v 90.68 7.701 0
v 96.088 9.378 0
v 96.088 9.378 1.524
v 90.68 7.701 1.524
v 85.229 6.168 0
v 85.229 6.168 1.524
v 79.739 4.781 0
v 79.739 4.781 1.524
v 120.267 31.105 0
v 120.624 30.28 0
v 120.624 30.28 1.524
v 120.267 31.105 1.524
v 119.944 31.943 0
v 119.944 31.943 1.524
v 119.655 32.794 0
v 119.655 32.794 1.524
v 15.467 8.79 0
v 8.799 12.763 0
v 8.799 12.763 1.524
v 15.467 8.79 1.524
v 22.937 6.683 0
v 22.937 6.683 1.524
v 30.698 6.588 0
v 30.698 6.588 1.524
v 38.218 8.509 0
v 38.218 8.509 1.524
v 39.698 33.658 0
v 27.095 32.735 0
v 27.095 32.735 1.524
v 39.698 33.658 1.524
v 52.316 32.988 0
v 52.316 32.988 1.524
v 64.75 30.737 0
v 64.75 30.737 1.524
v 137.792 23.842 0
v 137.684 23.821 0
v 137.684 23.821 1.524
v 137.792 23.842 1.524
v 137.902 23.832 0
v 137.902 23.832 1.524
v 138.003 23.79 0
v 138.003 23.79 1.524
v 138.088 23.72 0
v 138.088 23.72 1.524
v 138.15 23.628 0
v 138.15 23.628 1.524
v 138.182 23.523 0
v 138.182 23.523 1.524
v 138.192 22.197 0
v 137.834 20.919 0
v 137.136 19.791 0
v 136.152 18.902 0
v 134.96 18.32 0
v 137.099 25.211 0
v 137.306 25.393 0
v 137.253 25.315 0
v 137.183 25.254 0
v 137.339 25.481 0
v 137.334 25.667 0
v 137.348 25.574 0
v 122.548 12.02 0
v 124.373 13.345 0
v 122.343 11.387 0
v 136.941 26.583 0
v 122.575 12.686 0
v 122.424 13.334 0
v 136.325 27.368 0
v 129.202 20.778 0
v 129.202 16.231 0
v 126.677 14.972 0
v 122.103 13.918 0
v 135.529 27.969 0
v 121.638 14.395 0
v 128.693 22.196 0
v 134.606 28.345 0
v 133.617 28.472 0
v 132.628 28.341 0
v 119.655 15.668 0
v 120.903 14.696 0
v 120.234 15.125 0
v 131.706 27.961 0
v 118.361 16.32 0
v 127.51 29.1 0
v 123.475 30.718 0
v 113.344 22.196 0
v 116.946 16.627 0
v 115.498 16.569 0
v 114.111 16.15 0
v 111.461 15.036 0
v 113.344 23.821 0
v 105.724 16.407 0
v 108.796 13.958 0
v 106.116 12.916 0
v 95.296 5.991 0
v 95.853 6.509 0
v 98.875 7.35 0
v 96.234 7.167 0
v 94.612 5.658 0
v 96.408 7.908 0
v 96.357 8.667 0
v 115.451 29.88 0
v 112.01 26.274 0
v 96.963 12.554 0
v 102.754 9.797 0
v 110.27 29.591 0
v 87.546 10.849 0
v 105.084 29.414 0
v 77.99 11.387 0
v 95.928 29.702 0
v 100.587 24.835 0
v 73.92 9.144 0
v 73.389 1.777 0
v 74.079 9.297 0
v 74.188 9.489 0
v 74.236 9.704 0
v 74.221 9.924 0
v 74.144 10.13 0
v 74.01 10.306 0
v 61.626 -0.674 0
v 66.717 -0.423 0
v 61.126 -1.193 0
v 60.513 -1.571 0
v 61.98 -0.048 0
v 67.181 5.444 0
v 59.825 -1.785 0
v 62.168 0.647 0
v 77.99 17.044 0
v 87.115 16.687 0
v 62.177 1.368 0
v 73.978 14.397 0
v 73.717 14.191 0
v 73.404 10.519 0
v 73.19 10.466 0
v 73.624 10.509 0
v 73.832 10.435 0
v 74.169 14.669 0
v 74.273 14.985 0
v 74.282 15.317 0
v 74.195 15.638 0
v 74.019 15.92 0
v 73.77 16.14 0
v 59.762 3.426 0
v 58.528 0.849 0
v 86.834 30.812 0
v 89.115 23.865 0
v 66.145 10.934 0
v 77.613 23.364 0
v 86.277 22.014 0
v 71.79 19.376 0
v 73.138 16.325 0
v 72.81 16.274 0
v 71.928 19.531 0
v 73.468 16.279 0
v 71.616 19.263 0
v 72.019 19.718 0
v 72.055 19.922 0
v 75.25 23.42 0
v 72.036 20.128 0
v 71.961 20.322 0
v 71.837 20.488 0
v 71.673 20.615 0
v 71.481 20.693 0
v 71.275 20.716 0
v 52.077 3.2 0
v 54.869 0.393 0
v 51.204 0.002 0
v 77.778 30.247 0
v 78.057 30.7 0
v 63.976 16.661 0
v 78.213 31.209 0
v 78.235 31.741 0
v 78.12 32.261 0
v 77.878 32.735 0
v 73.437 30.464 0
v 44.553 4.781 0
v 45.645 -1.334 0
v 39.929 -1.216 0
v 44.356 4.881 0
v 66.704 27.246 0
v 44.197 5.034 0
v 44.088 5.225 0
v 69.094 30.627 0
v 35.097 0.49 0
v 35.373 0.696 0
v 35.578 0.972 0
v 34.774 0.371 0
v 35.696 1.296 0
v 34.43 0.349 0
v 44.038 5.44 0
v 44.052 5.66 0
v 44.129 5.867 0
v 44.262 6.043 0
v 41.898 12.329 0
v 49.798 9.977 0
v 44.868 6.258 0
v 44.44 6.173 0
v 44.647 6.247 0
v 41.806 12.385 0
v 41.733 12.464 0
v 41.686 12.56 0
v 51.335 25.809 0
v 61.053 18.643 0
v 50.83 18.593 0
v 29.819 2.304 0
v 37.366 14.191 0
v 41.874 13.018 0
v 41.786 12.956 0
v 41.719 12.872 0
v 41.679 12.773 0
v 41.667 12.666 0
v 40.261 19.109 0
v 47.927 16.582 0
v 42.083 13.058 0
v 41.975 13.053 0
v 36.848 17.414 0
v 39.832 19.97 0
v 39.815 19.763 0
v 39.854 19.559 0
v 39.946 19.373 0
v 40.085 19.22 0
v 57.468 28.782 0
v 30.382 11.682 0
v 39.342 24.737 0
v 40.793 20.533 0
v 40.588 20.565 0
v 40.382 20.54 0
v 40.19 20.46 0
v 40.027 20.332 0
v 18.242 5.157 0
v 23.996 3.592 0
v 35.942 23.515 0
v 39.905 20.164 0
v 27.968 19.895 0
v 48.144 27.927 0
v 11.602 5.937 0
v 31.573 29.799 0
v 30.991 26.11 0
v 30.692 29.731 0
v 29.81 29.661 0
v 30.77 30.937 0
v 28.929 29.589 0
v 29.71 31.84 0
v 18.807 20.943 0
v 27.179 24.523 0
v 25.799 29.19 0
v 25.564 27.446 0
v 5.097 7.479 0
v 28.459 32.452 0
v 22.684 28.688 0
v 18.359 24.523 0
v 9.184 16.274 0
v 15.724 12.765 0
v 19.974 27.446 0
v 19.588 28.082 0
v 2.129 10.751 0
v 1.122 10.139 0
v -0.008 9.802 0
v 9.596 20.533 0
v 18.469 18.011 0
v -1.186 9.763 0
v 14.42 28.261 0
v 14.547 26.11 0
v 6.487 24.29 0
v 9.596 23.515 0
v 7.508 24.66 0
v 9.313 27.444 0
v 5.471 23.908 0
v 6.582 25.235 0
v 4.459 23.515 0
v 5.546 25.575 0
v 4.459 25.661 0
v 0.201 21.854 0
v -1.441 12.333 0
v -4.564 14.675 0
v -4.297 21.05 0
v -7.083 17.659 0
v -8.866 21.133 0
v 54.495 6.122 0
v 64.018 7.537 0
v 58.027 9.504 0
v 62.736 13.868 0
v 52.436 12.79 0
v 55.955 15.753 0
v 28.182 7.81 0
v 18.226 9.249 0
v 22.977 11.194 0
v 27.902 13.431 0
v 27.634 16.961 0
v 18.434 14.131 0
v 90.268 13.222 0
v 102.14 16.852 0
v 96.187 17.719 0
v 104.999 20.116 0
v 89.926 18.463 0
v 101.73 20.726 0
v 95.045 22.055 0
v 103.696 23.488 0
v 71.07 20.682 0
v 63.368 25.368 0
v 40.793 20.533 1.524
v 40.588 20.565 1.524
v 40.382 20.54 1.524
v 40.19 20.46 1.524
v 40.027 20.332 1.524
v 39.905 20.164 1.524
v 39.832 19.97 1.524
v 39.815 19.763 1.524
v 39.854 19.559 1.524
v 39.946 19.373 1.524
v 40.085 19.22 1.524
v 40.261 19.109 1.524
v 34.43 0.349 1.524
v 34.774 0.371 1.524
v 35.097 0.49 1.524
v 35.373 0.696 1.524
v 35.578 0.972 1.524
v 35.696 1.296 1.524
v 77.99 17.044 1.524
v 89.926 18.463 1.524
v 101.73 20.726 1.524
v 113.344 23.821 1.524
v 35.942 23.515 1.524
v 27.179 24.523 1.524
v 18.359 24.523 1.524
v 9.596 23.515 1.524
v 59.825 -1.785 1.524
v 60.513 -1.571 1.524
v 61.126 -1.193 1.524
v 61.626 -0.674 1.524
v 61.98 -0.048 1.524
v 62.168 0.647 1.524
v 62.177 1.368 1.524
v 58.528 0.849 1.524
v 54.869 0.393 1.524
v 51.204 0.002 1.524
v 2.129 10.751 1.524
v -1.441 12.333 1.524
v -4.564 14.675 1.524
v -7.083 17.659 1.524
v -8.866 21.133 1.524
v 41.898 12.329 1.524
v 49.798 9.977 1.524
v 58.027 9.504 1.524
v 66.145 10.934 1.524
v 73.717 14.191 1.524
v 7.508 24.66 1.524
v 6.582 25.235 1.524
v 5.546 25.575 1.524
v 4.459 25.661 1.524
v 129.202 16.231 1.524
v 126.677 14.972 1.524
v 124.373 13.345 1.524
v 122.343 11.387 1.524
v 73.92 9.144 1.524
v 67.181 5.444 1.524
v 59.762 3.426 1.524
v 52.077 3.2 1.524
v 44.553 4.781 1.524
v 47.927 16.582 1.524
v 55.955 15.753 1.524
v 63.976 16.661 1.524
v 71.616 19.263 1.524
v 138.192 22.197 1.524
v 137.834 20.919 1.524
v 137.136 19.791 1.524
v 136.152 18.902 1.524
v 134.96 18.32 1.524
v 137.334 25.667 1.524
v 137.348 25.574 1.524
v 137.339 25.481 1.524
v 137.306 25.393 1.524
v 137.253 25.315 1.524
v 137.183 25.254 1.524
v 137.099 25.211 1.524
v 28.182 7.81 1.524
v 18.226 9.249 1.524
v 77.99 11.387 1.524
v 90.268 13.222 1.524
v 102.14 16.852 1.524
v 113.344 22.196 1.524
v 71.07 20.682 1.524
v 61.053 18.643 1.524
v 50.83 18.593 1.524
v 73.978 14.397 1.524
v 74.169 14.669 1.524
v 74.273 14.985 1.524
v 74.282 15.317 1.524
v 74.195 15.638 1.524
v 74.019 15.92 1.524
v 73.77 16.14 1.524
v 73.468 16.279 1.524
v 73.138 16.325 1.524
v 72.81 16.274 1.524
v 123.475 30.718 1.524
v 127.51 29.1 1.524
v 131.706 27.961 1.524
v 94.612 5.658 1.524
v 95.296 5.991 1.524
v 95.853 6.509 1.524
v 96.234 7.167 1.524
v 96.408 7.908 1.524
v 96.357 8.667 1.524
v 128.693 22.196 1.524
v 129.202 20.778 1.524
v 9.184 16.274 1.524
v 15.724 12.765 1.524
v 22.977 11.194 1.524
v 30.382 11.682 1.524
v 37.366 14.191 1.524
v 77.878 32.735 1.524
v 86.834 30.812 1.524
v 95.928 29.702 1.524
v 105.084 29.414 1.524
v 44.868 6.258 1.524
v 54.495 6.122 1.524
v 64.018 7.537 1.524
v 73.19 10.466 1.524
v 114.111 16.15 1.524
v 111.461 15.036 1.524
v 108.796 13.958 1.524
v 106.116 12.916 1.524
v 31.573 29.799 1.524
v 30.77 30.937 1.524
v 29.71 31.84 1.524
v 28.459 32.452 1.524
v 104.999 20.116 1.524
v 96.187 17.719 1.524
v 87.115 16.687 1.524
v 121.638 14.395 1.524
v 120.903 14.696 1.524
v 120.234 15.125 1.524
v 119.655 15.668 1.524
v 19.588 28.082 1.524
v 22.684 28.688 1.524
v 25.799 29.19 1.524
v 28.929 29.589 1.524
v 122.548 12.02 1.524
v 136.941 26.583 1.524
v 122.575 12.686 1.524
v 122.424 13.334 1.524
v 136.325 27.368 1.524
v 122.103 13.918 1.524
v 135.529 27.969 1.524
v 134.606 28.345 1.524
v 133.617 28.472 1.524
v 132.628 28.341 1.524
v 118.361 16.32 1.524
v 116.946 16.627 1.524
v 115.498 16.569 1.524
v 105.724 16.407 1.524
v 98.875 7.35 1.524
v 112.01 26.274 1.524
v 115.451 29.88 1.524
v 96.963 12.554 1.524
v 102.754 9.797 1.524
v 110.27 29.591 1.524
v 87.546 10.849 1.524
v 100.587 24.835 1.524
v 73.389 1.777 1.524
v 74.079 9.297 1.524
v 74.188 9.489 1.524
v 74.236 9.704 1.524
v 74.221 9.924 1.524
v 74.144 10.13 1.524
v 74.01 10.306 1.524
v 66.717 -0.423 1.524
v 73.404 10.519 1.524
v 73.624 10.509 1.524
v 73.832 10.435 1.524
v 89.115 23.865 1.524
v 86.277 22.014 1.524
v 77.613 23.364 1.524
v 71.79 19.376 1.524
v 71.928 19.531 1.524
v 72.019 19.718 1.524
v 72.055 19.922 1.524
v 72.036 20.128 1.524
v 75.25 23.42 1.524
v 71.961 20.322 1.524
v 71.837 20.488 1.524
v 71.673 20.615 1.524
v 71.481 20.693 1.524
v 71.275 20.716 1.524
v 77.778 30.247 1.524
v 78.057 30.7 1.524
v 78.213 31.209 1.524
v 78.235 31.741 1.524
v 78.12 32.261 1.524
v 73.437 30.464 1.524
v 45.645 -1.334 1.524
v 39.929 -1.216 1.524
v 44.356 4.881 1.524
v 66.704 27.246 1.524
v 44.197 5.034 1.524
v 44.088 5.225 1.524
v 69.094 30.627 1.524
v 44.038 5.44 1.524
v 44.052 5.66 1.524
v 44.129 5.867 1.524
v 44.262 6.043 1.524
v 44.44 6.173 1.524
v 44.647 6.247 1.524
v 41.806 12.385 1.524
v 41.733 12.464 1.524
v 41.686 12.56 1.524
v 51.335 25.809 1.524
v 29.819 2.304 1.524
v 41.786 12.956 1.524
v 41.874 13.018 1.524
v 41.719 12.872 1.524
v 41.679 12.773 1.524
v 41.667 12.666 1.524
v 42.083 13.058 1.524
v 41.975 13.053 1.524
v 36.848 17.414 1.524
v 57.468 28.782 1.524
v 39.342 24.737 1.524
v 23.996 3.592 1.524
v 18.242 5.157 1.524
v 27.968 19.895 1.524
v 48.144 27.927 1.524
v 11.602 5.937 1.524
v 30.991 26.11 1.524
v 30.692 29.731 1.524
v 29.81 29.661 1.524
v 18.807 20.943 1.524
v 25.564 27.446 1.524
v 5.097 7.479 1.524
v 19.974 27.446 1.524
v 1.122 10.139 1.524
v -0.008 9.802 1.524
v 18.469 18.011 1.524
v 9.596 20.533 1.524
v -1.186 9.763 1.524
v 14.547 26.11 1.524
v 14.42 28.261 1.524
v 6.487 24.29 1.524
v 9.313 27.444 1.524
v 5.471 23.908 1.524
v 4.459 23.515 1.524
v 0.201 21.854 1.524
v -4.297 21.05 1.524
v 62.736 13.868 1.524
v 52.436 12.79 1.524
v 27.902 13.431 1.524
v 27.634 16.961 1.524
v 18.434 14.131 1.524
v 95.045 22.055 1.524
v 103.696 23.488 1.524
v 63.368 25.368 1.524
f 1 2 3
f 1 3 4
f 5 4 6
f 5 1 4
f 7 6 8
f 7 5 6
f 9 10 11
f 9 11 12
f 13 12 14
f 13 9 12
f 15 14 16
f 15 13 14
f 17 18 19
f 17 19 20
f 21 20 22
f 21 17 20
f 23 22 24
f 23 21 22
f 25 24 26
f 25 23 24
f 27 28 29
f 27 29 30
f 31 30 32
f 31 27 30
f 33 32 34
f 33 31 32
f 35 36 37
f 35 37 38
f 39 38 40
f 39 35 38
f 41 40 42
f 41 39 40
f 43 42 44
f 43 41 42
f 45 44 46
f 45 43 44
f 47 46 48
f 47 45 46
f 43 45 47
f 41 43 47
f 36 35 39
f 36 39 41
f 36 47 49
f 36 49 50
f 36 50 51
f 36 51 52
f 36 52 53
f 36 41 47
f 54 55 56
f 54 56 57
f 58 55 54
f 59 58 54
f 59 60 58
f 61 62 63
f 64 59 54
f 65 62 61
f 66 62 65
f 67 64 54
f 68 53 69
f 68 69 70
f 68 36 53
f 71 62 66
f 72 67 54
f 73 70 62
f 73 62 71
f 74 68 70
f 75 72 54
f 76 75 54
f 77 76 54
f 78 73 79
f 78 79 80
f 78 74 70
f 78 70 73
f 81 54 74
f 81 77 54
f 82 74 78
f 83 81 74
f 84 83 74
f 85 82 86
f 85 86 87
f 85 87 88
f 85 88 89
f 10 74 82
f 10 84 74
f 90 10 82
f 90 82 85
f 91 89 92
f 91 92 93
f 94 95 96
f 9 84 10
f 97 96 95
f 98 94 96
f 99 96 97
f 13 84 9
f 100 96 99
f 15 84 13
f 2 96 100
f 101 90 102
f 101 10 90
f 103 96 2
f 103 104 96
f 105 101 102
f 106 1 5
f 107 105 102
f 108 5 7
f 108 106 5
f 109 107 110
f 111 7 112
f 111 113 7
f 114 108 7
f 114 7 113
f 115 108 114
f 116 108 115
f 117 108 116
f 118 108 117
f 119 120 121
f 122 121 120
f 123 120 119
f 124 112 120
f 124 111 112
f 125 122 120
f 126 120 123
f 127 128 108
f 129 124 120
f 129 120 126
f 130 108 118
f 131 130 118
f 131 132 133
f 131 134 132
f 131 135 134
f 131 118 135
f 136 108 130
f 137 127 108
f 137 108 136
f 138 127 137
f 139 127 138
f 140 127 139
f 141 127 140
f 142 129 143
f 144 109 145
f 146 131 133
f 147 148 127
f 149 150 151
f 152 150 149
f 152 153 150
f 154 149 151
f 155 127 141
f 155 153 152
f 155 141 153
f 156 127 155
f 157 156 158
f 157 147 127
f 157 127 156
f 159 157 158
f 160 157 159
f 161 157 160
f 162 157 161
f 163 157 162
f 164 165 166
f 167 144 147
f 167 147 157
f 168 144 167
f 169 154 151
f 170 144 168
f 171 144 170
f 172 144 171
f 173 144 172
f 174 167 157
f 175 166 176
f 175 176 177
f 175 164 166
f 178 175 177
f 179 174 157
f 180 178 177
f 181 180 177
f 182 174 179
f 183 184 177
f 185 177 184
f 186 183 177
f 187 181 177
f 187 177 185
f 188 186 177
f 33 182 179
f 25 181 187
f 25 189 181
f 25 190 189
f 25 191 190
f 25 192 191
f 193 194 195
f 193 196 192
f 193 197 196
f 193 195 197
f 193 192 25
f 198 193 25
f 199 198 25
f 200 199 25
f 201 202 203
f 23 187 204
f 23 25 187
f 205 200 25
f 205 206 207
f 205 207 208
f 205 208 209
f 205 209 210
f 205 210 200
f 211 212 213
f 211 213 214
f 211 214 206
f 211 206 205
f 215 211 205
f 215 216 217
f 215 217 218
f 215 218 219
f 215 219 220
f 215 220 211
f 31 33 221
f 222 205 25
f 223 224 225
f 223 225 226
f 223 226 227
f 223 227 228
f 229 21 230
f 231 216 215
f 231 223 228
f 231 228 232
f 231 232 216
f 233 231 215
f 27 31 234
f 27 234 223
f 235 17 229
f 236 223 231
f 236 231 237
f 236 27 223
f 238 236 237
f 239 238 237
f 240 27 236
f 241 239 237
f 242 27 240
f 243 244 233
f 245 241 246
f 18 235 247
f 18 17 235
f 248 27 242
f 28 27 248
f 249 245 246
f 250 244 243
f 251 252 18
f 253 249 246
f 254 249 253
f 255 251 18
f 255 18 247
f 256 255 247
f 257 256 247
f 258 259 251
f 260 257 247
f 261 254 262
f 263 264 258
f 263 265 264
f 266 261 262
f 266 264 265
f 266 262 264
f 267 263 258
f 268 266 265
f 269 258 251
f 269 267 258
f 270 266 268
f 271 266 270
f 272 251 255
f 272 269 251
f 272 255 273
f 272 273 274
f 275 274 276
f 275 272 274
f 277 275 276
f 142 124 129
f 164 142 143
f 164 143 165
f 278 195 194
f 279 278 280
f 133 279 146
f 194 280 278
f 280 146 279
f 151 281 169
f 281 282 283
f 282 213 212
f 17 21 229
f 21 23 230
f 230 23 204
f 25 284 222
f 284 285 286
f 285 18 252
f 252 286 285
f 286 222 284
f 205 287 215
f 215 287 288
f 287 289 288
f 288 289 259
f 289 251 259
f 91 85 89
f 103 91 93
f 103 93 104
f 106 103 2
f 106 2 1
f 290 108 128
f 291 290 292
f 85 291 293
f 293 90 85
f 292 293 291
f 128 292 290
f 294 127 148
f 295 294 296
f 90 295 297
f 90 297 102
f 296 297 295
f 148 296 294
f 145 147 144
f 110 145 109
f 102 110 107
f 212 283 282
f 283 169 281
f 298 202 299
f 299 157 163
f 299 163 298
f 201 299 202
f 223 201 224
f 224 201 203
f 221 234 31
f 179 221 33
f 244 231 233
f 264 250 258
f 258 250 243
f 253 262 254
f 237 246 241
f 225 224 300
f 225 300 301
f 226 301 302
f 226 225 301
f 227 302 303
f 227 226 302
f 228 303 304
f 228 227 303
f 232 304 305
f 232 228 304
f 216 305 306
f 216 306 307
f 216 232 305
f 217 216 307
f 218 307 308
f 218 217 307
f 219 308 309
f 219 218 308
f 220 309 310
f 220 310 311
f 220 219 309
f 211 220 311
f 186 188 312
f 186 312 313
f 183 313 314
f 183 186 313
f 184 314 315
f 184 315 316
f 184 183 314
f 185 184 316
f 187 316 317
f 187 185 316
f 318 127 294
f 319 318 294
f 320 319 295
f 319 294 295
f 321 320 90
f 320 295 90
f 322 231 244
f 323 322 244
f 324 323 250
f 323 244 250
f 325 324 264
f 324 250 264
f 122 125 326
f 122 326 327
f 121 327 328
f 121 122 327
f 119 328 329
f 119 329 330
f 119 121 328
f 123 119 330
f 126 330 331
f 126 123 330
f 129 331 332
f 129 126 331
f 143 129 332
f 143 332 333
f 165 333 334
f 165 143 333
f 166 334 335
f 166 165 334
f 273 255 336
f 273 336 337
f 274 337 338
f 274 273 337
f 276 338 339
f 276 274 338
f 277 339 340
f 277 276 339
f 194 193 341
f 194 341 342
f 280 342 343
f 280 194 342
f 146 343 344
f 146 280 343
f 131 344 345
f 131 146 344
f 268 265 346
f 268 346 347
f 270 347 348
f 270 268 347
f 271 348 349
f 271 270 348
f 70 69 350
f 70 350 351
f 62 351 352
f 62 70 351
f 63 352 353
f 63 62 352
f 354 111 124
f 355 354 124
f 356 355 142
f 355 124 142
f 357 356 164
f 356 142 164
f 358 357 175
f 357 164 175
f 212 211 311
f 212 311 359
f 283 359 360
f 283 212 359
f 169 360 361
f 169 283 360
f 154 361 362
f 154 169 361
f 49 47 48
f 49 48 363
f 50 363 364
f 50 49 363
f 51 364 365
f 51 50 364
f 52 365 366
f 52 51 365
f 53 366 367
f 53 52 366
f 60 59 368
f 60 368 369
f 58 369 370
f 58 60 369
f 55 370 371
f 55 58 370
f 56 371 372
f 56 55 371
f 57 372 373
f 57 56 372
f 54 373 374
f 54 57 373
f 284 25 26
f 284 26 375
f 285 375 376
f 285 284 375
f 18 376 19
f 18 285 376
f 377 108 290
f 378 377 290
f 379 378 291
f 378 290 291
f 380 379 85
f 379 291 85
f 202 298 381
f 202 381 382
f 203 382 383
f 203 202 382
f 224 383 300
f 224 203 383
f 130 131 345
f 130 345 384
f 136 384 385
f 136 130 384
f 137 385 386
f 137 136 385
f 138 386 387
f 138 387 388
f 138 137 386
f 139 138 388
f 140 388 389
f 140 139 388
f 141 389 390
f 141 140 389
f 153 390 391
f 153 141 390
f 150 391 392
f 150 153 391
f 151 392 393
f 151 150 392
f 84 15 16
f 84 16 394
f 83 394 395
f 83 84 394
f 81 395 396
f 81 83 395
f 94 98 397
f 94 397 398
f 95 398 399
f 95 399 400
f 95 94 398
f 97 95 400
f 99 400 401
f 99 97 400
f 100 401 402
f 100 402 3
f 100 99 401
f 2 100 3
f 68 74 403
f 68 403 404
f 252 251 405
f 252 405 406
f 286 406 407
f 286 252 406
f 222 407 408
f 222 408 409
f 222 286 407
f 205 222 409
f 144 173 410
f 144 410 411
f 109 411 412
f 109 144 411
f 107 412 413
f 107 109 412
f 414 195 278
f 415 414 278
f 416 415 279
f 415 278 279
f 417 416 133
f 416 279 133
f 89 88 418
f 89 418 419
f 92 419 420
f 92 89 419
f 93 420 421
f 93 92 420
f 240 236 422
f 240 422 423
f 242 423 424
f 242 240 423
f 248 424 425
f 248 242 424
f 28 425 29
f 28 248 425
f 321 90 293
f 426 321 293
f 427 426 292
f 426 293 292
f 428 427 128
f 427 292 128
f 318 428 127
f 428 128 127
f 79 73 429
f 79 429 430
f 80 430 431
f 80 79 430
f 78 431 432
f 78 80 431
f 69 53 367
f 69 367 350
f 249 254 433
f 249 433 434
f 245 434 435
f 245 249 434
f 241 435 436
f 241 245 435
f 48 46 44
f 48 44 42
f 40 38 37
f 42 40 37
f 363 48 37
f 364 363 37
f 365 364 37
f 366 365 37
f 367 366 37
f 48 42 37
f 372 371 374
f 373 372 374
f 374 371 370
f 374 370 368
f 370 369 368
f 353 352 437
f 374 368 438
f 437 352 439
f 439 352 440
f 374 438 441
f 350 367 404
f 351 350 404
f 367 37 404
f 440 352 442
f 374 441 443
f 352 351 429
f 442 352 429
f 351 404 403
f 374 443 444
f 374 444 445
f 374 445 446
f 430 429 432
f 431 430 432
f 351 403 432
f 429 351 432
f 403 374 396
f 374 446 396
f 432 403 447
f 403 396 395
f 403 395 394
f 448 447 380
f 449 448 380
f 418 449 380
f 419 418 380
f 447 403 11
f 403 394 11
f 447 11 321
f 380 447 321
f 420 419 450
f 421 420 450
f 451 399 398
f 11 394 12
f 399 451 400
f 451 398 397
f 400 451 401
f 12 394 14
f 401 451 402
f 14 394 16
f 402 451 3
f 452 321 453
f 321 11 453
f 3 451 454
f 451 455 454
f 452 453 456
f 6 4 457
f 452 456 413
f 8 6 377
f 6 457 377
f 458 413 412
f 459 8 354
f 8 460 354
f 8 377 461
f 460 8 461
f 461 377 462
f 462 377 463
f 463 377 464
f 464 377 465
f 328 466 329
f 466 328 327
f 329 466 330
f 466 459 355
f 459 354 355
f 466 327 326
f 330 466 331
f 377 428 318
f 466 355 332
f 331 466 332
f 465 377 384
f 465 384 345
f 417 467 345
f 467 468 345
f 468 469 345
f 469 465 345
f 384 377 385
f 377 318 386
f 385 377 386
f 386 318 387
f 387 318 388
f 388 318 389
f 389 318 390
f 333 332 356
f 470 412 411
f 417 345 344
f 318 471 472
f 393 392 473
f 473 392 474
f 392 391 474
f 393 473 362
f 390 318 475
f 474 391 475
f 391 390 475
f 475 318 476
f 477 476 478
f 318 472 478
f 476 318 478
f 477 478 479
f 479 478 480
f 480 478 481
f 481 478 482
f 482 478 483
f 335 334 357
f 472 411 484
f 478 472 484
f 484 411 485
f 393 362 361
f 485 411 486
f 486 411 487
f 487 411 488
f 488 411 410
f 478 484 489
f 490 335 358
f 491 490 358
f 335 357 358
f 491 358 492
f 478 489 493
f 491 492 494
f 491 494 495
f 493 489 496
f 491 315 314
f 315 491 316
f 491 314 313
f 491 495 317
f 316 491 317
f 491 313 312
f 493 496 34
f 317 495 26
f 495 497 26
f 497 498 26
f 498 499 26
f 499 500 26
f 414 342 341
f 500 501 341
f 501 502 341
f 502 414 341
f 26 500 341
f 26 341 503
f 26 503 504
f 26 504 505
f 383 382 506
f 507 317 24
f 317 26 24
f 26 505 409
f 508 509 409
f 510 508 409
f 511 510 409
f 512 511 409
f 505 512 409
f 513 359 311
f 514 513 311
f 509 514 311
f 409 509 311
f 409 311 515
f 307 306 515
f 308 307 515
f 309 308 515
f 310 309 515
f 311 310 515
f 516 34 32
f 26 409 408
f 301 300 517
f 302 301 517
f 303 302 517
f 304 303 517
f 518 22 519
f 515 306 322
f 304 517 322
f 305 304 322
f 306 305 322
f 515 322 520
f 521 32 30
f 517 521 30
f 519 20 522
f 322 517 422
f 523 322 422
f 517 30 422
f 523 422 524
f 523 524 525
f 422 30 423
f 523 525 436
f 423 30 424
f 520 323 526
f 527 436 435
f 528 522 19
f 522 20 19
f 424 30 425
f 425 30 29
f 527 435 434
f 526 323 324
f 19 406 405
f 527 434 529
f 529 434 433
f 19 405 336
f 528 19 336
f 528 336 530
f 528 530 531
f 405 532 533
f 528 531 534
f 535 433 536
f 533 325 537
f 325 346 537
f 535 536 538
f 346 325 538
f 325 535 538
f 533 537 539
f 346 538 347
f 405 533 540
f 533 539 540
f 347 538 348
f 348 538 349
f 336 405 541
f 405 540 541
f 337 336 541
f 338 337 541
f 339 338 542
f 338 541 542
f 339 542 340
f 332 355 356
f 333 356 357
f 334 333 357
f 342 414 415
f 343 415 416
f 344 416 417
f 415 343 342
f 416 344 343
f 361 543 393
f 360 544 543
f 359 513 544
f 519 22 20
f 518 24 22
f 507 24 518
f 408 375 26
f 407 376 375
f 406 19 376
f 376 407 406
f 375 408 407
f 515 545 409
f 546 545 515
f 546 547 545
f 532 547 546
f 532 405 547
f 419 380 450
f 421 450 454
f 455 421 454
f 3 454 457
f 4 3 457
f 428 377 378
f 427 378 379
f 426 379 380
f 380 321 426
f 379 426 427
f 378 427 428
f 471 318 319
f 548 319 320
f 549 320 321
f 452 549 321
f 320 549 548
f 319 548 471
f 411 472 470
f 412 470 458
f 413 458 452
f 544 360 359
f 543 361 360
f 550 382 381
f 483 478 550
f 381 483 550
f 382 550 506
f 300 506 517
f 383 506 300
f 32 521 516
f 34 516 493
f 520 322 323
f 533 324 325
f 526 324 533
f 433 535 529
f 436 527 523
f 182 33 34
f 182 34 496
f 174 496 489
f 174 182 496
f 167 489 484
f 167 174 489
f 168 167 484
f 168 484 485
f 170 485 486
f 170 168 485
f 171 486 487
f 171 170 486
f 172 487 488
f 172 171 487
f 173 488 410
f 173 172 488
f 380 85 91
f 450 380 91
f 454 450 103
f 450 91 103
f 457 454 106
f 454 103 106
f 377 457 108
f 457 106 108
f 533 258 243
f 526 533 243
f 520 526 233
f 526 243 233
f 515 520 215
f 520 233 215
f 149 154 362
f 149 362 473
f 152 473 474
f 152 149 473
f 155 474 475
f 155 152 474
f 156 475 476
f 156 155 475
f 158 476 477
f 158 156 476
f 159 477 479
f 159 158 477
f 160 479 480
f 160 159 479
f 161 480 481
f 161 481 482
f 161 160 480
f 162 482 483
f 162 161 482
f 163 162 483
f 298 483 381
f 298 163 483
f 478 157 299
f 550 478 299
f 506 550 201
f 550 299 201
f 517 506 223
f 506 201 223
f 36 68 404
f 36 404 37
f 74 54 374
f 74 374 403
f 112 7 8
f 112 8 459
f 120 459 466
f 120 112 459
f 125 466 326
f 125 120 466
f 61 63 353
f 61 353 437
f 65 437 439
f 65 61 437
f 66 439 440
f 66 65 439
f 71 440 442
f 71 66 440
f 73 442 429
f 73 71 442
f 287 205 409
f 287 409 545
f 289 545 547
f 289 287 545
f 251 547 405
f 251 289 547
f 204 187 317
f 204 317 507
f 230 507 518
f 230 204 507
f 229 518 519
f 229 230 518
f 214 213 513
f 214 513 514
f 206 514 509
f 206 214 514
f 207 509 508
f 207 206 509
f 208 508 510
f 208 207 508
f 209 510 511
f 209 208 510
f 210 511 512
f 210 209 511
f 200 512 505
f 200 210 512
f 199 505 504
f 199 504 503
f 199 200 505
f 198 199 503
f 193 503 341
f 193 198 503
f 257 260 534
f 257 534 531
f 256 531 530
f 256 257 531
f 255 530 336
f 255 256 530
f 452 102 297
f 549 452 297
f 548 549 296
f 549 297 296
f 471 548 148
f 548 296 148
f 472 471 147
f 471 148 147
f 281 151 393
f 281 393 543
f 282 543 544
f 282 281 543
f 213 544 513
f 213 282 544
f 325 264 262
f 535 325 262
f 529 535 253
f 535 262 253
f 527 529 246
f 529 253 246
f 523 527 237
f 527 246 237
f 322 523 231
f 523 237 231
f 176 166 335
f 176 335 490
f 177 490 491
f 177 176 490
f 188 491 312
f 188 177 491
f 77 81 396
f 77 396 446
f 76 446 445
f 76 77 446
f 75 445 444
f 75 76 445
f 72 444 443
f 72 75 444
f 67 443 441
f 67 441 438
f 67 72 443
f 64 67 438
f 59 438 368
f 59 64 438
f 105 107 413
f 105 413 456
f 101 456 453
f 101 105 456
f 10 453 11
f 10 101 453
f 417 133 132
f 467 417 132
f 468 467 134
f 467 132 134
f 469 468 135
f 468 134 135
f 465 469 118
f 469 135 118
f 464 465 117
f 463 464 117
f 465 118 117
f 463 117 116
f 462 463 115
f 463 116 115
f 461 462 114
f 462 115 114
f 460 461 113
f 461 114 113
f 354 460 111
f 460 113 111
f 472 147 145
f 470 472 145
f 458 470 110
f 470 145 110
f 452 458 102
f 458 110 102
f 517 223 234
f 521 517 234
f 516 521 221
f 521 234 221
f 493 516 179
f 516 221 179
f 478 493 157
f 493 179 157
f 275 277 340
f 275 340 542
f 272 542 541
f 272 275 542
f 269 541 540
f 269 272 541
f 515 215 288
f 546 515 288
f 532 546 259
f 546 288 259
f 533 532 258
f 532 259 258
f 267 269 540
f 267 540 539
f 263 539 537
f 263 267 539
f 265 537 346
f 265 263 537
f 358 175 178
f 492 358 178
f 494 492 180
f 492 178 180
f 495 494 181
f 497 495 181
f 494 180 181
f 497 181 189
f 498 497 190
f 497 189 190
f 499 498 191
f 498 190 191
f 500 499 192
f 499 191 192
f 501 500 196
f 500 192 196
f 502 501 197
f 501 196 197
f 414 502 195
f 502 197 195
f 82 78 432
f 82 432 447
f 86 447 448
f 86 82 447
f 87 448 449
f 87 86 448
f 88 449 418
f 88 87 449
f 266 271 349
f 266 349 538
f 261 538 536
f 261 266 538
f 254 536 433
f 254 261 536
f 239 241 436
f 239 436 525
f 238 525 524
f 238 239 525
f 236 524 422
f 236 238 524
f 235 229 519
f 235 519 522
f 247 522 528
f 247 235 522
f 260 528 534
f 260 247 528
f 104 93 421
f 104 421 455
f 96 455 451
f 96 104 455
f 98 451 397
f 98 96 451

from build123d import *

# Parameters (mm, degrees)
BOSS_EXTRUDE1_DEPTH = 1.524


with BuildPart() as part:
    # Model → Boss-Extrude1 (new body)
    with BuildSketch(Plane.XY):
        with BuildLine():
            Line((134.96008858, 18.319511963), (129.201538518, 16.231235276))
            ThreePointArc((129.201538518, 16.231235276), (125.494314224, 14.202109959), (122.342593367, 11.386525267))
            ThreePointArc((122.342593367, 11.386525267), (122.521547644, 13.015286897), (121.637755911, 14.395069943))
            ThreePointArc((121.637755911, 14.395069943), (120.558535261, 14.894839146), (119.655012959, 15.668230327))
            ThreePointArc((119.655012959, 15.668230327), (116.945656671, 16.627230011), (114.111435919, 16.150276533))
            ThreePointArc((114.111435919, 16.150276533), (110.130348083, 14.492411945), (106.116427247, 12.915701804))
            ThreePointArc((106.116427247, 12.915701804), (100.871077069, 8.483544727), (94.612309809, 5.65767367))
            ThreePointArc((94.612309809, 5.65767367), (96.234412345, 7.167311858), (96.088279041, 9.378390589))
            ThreePointArc((96.088279041, 9.378390589), (87.959563224, 6.916430033), (79.738932416, 4.781365698))
            ThreePointArc((79.738932416, 4.781365698), (70.087015382, 0.573629162), (59.825334355, -1.784855875))
            ThreePointArc((59.825334355, -1.784855875), (61.625546567, -0.674388225), (62.177186804, 1.367570505))
            ThreePointArc((62.177186804, 1.367570505), (56.69945513, 0.613180121), (51.20394484, 0.001611808))
            ThreePointArc((51.20394484, 0.001611808), (42.783253785, -1.45847583), (34.430253575, 0.349086412))
            ThreePointArc((34.430253575, 0.349086412), (35.242407465, 0.582998344), (35.696308866, 1.295937508))
            ThreePointArc((35.696308866, 1.295937508), (26.899874012, 2.912690878), (18.24226034, 5.156991018))
            ThreePointArc((18.24226034, 5.156991018), (8.327270493, 6.613476825), (-1.186477097, 9.762600728))
            ThreePointArc((-1.186477097, 9.762600728), (0.567723509, 9.933888345), (2.129376981, 10.751077214))
            ThreePointArc((2.129376981, 10.751077214), (-4.564424076, 14.67509235), (-8.866303828, 21.132545253))
            ThreePointArc((-8.866303828, 21.132545253), (-2.028267146, 21.342243043), (4.458921798, 23.51459164))
            ThreePointArc((4.458921798, 23.51459164), (5.978589155, 24.100559155), (7.508094135, 24.660346004))
            ThreePointArc((7.508094135, 24.660346004), (6.073839254, 25.435989759), (4.458921798, 25.661271599))
            ThreePointArc((4.458921798, 25.661271599), (11.846812063, 27.976344953), (19.588212991, 28.082169784))
            ThreePointArc((19.588212991, 28.082169784), (24.23969735, 28.951914388), (28.92877134, 29.588583491))
            ThreePointArc((28.92877134, 29.588583491), (30.250891965, 29.696247396), (31.57341018, 29.798912074))
            ThreePointArc((31.57341018, 29.798912074), (29.710039, 31.839896858), (27.095456614, 32.73529062))
            ThreePointArc((27.095456614, 32.73529062), (46.017315853, 33.521760077), (64.749650783, 30.73699449))
            ThreePointArc((64.749650783, 30.73699449), (71.265909378, 30.552300799), (77.77761193, 30.246575893))
            ThreePointArc((77.77761193, 30.246575893), (78.240878226, 31.474299031), (77.877808016, 32.73529062))
            ThreePointArc((77.877808016, 32.73529062), (91.368554355, 30.154894712), (105.083859187, 29.413886469))
            ThreePointArc((105.083859187, 29.413886469), (112.860951548, 29.721873992), (120.624125013, 30.279690879))
            ThreePointArc((120.624125013, 30.279690879), (120.101426826, 31.522338532), (119.655012959, 32.794384617))
            ThreePointArc((119.655012959, 32.794384617), (125.469075261, 29.850060932), (131.706292975, 27.960754811))
            ThreePointArc((131.706292975, 27.960754811), (135.079830026, 28.186864843), (137.333813614, 25.666659301))
            ThreePointArc((137.333813614, 25.666659301), (137.306373673, 25.392750403), (137.099398505, 25.211255734))
            Line((137.099398505, 25.211255734), (128.692975928, 22.19615093))
            Line((128.692975928, 22.19615093), (129.201538518, 20.777960276))
            Line((129.201538518, 20.777960276), (137.683967254, 23.82080051))
            ThreePointArc((137.683967254, 23.82080051), (138.003306934, 23.78963562), (138.181844931, 23.523039923))
            ThreePointArc((138.181844931, 23.523039923), (137.524769068, 20.330730705), (134.96008858, 18.319511963))
        make_face()
        with BuildLine():
            ThreePointArc((113.344379689, 22.19615093), (96.963122218, 12.553503985), (77.990394499, 11.386525267))
            ThreePointArc((77.990394499, 11.386525267), (96.271224533, 14.816426058), (113.344379689, 22.19615093))
        make_face(mode=Mode.SUBTRACT)
        with BuildLine():
            ThreePointArc((113.344379689, 23.82080051), (96.187450512, 17.719248724), (77.990394499, 17.043744891))
            ThreePointArc((77.990394499, 17.043744891), (95.848162694, 19.489217449), (113.344379689, 23.82080051))
        make_face(mode=Mode.SUBTRACT)
        with BuildLine():
            ThreePointArc((112.010038699, 26.273742515), (95.04541072, 22.055495603), (77.613248587, 23.363904105))
            ThreePointArc((77.613248587, 23.363904105), (94.856261251, 24.29140484), (112.010038699, 26.273742515))
        make_face(mode=Mode.SUBTRACT)
        with BuildLine():
            ThreePointArc((73.920433764, 9.144198092), (59.762067232, 3.425519676), (44.552717894, 4.781365698))
            ThreePointArc((44.552717894, 4.781365698), (44.052345371, 5.659967485), (44.86760609, 6.258017419))
            ThreePointArc((44.86760609, 6.258017419), (59.284947166, 6.637177896), (73.189879005, 10.465540071))
            ThreePointArc((73.189879005, 10.465540071), (74.143785851, 10.130315533), (73.920433764, 9.144198092))
        make_face(mode=Mode.SUBTRACT)
        with BuildLine():
            ThreePointArc((73.7171882, 14.19085222), (74.195068041, 15.63804442), (72.809895852, 16.27367986))
            ThreePointArc((72.809895852, 16.27367986), (57.603683966, 13.161162203), (42.082533848, 13.058472776))
            ThreePointArc((42.082533848, 13.058472776), (41.678568271, 12.772614258), (41.897709615, 12.328902245))
            ThreePointArc((41.897709615, 12.328902245), (58.027223609, 9.504074716), (73.7171882, 14.19085222))
        make_face(mode=Mode.SUBTRACT)
        with BuildLine():
            ThreePointArc((71.615953494, 19.263251529), (72.005249, 20.227653753), (71.069824737, 20.682190977))
            ThreePointArc((71.069824737, 20.682190977), (55.942470801, 18.367444511), (40.793050931, 20.533077418))
            ThreePointArc((40.793050931, 20.533077418), (39.862149142, 20.069348511), (40.260924923, 19.10882755))
            ThreePointArc((40.260924923, 19.10882755), (55.955346454, 15.753106638), (71.615953494, 19.263251529))
        make_face(mode=Mode.SUBTRACT)
        with BuildLine():
            ThreePointArc((75.249897816, 23.419828185), (57.358073705, 25.777828917), (39.34157015, 24.737090166))
            ThreePointArc((39.34157015, 24.737090166), (57.468271047, 28.781788902), (75.249897816, 23.419828185))
        make_face(mode=Mode.SUBTRACT)
        with BuildLine():
            ThreePointArc((38.218093055, 8.509361046), (23.165664514, 8.263848957), (8.79939997, 12.763440518))
            ThreePointArc((8.79939997, 12.763440518), (22.937130999, 6.683446576), (38.218093055, 8.509361046))
        make_face(mode=Mode.SUBTRACT)
        with BuildLine():
            ThreePointArc((37.366333435, 14.19085222), (23.1546149, 13.598745989), (9.184351398, 16.27367986))
            ThreePointArc((9.184351398, 16.27367986), (22.976923316, 11.194465897), (37.366333435, 14.19085222))
        make_face(mode=Mode.SUBTRACT)
        with BuildLine():
            ThreePointArc((36.84813704, 17.413649418), (23.030567399, 17.299167045), (9.596276919, 20.533077418))
            ThreePointArc((9.596276919, 20.533077418), (23.40846607, 20.600554903), (36.84813704, 17.413649418))
        make_face(mode=Mode.SUBTRACT)
        with BuildLine():
            ThreePointArc((35.94161169, 23.51459164), (22.768944305, 24.649665002), (9.596276919, 23.51459164))
            ThreePointArc((9.596276919, 23.51459164), (22.768944305, 27.614666916), (35.94161169, 23.51459164))
        make_face(mode=Mode.SUBTRACT)
    extrude(amount=BOSS_EXTRUDE1_DEPTH)


solid = part.part
